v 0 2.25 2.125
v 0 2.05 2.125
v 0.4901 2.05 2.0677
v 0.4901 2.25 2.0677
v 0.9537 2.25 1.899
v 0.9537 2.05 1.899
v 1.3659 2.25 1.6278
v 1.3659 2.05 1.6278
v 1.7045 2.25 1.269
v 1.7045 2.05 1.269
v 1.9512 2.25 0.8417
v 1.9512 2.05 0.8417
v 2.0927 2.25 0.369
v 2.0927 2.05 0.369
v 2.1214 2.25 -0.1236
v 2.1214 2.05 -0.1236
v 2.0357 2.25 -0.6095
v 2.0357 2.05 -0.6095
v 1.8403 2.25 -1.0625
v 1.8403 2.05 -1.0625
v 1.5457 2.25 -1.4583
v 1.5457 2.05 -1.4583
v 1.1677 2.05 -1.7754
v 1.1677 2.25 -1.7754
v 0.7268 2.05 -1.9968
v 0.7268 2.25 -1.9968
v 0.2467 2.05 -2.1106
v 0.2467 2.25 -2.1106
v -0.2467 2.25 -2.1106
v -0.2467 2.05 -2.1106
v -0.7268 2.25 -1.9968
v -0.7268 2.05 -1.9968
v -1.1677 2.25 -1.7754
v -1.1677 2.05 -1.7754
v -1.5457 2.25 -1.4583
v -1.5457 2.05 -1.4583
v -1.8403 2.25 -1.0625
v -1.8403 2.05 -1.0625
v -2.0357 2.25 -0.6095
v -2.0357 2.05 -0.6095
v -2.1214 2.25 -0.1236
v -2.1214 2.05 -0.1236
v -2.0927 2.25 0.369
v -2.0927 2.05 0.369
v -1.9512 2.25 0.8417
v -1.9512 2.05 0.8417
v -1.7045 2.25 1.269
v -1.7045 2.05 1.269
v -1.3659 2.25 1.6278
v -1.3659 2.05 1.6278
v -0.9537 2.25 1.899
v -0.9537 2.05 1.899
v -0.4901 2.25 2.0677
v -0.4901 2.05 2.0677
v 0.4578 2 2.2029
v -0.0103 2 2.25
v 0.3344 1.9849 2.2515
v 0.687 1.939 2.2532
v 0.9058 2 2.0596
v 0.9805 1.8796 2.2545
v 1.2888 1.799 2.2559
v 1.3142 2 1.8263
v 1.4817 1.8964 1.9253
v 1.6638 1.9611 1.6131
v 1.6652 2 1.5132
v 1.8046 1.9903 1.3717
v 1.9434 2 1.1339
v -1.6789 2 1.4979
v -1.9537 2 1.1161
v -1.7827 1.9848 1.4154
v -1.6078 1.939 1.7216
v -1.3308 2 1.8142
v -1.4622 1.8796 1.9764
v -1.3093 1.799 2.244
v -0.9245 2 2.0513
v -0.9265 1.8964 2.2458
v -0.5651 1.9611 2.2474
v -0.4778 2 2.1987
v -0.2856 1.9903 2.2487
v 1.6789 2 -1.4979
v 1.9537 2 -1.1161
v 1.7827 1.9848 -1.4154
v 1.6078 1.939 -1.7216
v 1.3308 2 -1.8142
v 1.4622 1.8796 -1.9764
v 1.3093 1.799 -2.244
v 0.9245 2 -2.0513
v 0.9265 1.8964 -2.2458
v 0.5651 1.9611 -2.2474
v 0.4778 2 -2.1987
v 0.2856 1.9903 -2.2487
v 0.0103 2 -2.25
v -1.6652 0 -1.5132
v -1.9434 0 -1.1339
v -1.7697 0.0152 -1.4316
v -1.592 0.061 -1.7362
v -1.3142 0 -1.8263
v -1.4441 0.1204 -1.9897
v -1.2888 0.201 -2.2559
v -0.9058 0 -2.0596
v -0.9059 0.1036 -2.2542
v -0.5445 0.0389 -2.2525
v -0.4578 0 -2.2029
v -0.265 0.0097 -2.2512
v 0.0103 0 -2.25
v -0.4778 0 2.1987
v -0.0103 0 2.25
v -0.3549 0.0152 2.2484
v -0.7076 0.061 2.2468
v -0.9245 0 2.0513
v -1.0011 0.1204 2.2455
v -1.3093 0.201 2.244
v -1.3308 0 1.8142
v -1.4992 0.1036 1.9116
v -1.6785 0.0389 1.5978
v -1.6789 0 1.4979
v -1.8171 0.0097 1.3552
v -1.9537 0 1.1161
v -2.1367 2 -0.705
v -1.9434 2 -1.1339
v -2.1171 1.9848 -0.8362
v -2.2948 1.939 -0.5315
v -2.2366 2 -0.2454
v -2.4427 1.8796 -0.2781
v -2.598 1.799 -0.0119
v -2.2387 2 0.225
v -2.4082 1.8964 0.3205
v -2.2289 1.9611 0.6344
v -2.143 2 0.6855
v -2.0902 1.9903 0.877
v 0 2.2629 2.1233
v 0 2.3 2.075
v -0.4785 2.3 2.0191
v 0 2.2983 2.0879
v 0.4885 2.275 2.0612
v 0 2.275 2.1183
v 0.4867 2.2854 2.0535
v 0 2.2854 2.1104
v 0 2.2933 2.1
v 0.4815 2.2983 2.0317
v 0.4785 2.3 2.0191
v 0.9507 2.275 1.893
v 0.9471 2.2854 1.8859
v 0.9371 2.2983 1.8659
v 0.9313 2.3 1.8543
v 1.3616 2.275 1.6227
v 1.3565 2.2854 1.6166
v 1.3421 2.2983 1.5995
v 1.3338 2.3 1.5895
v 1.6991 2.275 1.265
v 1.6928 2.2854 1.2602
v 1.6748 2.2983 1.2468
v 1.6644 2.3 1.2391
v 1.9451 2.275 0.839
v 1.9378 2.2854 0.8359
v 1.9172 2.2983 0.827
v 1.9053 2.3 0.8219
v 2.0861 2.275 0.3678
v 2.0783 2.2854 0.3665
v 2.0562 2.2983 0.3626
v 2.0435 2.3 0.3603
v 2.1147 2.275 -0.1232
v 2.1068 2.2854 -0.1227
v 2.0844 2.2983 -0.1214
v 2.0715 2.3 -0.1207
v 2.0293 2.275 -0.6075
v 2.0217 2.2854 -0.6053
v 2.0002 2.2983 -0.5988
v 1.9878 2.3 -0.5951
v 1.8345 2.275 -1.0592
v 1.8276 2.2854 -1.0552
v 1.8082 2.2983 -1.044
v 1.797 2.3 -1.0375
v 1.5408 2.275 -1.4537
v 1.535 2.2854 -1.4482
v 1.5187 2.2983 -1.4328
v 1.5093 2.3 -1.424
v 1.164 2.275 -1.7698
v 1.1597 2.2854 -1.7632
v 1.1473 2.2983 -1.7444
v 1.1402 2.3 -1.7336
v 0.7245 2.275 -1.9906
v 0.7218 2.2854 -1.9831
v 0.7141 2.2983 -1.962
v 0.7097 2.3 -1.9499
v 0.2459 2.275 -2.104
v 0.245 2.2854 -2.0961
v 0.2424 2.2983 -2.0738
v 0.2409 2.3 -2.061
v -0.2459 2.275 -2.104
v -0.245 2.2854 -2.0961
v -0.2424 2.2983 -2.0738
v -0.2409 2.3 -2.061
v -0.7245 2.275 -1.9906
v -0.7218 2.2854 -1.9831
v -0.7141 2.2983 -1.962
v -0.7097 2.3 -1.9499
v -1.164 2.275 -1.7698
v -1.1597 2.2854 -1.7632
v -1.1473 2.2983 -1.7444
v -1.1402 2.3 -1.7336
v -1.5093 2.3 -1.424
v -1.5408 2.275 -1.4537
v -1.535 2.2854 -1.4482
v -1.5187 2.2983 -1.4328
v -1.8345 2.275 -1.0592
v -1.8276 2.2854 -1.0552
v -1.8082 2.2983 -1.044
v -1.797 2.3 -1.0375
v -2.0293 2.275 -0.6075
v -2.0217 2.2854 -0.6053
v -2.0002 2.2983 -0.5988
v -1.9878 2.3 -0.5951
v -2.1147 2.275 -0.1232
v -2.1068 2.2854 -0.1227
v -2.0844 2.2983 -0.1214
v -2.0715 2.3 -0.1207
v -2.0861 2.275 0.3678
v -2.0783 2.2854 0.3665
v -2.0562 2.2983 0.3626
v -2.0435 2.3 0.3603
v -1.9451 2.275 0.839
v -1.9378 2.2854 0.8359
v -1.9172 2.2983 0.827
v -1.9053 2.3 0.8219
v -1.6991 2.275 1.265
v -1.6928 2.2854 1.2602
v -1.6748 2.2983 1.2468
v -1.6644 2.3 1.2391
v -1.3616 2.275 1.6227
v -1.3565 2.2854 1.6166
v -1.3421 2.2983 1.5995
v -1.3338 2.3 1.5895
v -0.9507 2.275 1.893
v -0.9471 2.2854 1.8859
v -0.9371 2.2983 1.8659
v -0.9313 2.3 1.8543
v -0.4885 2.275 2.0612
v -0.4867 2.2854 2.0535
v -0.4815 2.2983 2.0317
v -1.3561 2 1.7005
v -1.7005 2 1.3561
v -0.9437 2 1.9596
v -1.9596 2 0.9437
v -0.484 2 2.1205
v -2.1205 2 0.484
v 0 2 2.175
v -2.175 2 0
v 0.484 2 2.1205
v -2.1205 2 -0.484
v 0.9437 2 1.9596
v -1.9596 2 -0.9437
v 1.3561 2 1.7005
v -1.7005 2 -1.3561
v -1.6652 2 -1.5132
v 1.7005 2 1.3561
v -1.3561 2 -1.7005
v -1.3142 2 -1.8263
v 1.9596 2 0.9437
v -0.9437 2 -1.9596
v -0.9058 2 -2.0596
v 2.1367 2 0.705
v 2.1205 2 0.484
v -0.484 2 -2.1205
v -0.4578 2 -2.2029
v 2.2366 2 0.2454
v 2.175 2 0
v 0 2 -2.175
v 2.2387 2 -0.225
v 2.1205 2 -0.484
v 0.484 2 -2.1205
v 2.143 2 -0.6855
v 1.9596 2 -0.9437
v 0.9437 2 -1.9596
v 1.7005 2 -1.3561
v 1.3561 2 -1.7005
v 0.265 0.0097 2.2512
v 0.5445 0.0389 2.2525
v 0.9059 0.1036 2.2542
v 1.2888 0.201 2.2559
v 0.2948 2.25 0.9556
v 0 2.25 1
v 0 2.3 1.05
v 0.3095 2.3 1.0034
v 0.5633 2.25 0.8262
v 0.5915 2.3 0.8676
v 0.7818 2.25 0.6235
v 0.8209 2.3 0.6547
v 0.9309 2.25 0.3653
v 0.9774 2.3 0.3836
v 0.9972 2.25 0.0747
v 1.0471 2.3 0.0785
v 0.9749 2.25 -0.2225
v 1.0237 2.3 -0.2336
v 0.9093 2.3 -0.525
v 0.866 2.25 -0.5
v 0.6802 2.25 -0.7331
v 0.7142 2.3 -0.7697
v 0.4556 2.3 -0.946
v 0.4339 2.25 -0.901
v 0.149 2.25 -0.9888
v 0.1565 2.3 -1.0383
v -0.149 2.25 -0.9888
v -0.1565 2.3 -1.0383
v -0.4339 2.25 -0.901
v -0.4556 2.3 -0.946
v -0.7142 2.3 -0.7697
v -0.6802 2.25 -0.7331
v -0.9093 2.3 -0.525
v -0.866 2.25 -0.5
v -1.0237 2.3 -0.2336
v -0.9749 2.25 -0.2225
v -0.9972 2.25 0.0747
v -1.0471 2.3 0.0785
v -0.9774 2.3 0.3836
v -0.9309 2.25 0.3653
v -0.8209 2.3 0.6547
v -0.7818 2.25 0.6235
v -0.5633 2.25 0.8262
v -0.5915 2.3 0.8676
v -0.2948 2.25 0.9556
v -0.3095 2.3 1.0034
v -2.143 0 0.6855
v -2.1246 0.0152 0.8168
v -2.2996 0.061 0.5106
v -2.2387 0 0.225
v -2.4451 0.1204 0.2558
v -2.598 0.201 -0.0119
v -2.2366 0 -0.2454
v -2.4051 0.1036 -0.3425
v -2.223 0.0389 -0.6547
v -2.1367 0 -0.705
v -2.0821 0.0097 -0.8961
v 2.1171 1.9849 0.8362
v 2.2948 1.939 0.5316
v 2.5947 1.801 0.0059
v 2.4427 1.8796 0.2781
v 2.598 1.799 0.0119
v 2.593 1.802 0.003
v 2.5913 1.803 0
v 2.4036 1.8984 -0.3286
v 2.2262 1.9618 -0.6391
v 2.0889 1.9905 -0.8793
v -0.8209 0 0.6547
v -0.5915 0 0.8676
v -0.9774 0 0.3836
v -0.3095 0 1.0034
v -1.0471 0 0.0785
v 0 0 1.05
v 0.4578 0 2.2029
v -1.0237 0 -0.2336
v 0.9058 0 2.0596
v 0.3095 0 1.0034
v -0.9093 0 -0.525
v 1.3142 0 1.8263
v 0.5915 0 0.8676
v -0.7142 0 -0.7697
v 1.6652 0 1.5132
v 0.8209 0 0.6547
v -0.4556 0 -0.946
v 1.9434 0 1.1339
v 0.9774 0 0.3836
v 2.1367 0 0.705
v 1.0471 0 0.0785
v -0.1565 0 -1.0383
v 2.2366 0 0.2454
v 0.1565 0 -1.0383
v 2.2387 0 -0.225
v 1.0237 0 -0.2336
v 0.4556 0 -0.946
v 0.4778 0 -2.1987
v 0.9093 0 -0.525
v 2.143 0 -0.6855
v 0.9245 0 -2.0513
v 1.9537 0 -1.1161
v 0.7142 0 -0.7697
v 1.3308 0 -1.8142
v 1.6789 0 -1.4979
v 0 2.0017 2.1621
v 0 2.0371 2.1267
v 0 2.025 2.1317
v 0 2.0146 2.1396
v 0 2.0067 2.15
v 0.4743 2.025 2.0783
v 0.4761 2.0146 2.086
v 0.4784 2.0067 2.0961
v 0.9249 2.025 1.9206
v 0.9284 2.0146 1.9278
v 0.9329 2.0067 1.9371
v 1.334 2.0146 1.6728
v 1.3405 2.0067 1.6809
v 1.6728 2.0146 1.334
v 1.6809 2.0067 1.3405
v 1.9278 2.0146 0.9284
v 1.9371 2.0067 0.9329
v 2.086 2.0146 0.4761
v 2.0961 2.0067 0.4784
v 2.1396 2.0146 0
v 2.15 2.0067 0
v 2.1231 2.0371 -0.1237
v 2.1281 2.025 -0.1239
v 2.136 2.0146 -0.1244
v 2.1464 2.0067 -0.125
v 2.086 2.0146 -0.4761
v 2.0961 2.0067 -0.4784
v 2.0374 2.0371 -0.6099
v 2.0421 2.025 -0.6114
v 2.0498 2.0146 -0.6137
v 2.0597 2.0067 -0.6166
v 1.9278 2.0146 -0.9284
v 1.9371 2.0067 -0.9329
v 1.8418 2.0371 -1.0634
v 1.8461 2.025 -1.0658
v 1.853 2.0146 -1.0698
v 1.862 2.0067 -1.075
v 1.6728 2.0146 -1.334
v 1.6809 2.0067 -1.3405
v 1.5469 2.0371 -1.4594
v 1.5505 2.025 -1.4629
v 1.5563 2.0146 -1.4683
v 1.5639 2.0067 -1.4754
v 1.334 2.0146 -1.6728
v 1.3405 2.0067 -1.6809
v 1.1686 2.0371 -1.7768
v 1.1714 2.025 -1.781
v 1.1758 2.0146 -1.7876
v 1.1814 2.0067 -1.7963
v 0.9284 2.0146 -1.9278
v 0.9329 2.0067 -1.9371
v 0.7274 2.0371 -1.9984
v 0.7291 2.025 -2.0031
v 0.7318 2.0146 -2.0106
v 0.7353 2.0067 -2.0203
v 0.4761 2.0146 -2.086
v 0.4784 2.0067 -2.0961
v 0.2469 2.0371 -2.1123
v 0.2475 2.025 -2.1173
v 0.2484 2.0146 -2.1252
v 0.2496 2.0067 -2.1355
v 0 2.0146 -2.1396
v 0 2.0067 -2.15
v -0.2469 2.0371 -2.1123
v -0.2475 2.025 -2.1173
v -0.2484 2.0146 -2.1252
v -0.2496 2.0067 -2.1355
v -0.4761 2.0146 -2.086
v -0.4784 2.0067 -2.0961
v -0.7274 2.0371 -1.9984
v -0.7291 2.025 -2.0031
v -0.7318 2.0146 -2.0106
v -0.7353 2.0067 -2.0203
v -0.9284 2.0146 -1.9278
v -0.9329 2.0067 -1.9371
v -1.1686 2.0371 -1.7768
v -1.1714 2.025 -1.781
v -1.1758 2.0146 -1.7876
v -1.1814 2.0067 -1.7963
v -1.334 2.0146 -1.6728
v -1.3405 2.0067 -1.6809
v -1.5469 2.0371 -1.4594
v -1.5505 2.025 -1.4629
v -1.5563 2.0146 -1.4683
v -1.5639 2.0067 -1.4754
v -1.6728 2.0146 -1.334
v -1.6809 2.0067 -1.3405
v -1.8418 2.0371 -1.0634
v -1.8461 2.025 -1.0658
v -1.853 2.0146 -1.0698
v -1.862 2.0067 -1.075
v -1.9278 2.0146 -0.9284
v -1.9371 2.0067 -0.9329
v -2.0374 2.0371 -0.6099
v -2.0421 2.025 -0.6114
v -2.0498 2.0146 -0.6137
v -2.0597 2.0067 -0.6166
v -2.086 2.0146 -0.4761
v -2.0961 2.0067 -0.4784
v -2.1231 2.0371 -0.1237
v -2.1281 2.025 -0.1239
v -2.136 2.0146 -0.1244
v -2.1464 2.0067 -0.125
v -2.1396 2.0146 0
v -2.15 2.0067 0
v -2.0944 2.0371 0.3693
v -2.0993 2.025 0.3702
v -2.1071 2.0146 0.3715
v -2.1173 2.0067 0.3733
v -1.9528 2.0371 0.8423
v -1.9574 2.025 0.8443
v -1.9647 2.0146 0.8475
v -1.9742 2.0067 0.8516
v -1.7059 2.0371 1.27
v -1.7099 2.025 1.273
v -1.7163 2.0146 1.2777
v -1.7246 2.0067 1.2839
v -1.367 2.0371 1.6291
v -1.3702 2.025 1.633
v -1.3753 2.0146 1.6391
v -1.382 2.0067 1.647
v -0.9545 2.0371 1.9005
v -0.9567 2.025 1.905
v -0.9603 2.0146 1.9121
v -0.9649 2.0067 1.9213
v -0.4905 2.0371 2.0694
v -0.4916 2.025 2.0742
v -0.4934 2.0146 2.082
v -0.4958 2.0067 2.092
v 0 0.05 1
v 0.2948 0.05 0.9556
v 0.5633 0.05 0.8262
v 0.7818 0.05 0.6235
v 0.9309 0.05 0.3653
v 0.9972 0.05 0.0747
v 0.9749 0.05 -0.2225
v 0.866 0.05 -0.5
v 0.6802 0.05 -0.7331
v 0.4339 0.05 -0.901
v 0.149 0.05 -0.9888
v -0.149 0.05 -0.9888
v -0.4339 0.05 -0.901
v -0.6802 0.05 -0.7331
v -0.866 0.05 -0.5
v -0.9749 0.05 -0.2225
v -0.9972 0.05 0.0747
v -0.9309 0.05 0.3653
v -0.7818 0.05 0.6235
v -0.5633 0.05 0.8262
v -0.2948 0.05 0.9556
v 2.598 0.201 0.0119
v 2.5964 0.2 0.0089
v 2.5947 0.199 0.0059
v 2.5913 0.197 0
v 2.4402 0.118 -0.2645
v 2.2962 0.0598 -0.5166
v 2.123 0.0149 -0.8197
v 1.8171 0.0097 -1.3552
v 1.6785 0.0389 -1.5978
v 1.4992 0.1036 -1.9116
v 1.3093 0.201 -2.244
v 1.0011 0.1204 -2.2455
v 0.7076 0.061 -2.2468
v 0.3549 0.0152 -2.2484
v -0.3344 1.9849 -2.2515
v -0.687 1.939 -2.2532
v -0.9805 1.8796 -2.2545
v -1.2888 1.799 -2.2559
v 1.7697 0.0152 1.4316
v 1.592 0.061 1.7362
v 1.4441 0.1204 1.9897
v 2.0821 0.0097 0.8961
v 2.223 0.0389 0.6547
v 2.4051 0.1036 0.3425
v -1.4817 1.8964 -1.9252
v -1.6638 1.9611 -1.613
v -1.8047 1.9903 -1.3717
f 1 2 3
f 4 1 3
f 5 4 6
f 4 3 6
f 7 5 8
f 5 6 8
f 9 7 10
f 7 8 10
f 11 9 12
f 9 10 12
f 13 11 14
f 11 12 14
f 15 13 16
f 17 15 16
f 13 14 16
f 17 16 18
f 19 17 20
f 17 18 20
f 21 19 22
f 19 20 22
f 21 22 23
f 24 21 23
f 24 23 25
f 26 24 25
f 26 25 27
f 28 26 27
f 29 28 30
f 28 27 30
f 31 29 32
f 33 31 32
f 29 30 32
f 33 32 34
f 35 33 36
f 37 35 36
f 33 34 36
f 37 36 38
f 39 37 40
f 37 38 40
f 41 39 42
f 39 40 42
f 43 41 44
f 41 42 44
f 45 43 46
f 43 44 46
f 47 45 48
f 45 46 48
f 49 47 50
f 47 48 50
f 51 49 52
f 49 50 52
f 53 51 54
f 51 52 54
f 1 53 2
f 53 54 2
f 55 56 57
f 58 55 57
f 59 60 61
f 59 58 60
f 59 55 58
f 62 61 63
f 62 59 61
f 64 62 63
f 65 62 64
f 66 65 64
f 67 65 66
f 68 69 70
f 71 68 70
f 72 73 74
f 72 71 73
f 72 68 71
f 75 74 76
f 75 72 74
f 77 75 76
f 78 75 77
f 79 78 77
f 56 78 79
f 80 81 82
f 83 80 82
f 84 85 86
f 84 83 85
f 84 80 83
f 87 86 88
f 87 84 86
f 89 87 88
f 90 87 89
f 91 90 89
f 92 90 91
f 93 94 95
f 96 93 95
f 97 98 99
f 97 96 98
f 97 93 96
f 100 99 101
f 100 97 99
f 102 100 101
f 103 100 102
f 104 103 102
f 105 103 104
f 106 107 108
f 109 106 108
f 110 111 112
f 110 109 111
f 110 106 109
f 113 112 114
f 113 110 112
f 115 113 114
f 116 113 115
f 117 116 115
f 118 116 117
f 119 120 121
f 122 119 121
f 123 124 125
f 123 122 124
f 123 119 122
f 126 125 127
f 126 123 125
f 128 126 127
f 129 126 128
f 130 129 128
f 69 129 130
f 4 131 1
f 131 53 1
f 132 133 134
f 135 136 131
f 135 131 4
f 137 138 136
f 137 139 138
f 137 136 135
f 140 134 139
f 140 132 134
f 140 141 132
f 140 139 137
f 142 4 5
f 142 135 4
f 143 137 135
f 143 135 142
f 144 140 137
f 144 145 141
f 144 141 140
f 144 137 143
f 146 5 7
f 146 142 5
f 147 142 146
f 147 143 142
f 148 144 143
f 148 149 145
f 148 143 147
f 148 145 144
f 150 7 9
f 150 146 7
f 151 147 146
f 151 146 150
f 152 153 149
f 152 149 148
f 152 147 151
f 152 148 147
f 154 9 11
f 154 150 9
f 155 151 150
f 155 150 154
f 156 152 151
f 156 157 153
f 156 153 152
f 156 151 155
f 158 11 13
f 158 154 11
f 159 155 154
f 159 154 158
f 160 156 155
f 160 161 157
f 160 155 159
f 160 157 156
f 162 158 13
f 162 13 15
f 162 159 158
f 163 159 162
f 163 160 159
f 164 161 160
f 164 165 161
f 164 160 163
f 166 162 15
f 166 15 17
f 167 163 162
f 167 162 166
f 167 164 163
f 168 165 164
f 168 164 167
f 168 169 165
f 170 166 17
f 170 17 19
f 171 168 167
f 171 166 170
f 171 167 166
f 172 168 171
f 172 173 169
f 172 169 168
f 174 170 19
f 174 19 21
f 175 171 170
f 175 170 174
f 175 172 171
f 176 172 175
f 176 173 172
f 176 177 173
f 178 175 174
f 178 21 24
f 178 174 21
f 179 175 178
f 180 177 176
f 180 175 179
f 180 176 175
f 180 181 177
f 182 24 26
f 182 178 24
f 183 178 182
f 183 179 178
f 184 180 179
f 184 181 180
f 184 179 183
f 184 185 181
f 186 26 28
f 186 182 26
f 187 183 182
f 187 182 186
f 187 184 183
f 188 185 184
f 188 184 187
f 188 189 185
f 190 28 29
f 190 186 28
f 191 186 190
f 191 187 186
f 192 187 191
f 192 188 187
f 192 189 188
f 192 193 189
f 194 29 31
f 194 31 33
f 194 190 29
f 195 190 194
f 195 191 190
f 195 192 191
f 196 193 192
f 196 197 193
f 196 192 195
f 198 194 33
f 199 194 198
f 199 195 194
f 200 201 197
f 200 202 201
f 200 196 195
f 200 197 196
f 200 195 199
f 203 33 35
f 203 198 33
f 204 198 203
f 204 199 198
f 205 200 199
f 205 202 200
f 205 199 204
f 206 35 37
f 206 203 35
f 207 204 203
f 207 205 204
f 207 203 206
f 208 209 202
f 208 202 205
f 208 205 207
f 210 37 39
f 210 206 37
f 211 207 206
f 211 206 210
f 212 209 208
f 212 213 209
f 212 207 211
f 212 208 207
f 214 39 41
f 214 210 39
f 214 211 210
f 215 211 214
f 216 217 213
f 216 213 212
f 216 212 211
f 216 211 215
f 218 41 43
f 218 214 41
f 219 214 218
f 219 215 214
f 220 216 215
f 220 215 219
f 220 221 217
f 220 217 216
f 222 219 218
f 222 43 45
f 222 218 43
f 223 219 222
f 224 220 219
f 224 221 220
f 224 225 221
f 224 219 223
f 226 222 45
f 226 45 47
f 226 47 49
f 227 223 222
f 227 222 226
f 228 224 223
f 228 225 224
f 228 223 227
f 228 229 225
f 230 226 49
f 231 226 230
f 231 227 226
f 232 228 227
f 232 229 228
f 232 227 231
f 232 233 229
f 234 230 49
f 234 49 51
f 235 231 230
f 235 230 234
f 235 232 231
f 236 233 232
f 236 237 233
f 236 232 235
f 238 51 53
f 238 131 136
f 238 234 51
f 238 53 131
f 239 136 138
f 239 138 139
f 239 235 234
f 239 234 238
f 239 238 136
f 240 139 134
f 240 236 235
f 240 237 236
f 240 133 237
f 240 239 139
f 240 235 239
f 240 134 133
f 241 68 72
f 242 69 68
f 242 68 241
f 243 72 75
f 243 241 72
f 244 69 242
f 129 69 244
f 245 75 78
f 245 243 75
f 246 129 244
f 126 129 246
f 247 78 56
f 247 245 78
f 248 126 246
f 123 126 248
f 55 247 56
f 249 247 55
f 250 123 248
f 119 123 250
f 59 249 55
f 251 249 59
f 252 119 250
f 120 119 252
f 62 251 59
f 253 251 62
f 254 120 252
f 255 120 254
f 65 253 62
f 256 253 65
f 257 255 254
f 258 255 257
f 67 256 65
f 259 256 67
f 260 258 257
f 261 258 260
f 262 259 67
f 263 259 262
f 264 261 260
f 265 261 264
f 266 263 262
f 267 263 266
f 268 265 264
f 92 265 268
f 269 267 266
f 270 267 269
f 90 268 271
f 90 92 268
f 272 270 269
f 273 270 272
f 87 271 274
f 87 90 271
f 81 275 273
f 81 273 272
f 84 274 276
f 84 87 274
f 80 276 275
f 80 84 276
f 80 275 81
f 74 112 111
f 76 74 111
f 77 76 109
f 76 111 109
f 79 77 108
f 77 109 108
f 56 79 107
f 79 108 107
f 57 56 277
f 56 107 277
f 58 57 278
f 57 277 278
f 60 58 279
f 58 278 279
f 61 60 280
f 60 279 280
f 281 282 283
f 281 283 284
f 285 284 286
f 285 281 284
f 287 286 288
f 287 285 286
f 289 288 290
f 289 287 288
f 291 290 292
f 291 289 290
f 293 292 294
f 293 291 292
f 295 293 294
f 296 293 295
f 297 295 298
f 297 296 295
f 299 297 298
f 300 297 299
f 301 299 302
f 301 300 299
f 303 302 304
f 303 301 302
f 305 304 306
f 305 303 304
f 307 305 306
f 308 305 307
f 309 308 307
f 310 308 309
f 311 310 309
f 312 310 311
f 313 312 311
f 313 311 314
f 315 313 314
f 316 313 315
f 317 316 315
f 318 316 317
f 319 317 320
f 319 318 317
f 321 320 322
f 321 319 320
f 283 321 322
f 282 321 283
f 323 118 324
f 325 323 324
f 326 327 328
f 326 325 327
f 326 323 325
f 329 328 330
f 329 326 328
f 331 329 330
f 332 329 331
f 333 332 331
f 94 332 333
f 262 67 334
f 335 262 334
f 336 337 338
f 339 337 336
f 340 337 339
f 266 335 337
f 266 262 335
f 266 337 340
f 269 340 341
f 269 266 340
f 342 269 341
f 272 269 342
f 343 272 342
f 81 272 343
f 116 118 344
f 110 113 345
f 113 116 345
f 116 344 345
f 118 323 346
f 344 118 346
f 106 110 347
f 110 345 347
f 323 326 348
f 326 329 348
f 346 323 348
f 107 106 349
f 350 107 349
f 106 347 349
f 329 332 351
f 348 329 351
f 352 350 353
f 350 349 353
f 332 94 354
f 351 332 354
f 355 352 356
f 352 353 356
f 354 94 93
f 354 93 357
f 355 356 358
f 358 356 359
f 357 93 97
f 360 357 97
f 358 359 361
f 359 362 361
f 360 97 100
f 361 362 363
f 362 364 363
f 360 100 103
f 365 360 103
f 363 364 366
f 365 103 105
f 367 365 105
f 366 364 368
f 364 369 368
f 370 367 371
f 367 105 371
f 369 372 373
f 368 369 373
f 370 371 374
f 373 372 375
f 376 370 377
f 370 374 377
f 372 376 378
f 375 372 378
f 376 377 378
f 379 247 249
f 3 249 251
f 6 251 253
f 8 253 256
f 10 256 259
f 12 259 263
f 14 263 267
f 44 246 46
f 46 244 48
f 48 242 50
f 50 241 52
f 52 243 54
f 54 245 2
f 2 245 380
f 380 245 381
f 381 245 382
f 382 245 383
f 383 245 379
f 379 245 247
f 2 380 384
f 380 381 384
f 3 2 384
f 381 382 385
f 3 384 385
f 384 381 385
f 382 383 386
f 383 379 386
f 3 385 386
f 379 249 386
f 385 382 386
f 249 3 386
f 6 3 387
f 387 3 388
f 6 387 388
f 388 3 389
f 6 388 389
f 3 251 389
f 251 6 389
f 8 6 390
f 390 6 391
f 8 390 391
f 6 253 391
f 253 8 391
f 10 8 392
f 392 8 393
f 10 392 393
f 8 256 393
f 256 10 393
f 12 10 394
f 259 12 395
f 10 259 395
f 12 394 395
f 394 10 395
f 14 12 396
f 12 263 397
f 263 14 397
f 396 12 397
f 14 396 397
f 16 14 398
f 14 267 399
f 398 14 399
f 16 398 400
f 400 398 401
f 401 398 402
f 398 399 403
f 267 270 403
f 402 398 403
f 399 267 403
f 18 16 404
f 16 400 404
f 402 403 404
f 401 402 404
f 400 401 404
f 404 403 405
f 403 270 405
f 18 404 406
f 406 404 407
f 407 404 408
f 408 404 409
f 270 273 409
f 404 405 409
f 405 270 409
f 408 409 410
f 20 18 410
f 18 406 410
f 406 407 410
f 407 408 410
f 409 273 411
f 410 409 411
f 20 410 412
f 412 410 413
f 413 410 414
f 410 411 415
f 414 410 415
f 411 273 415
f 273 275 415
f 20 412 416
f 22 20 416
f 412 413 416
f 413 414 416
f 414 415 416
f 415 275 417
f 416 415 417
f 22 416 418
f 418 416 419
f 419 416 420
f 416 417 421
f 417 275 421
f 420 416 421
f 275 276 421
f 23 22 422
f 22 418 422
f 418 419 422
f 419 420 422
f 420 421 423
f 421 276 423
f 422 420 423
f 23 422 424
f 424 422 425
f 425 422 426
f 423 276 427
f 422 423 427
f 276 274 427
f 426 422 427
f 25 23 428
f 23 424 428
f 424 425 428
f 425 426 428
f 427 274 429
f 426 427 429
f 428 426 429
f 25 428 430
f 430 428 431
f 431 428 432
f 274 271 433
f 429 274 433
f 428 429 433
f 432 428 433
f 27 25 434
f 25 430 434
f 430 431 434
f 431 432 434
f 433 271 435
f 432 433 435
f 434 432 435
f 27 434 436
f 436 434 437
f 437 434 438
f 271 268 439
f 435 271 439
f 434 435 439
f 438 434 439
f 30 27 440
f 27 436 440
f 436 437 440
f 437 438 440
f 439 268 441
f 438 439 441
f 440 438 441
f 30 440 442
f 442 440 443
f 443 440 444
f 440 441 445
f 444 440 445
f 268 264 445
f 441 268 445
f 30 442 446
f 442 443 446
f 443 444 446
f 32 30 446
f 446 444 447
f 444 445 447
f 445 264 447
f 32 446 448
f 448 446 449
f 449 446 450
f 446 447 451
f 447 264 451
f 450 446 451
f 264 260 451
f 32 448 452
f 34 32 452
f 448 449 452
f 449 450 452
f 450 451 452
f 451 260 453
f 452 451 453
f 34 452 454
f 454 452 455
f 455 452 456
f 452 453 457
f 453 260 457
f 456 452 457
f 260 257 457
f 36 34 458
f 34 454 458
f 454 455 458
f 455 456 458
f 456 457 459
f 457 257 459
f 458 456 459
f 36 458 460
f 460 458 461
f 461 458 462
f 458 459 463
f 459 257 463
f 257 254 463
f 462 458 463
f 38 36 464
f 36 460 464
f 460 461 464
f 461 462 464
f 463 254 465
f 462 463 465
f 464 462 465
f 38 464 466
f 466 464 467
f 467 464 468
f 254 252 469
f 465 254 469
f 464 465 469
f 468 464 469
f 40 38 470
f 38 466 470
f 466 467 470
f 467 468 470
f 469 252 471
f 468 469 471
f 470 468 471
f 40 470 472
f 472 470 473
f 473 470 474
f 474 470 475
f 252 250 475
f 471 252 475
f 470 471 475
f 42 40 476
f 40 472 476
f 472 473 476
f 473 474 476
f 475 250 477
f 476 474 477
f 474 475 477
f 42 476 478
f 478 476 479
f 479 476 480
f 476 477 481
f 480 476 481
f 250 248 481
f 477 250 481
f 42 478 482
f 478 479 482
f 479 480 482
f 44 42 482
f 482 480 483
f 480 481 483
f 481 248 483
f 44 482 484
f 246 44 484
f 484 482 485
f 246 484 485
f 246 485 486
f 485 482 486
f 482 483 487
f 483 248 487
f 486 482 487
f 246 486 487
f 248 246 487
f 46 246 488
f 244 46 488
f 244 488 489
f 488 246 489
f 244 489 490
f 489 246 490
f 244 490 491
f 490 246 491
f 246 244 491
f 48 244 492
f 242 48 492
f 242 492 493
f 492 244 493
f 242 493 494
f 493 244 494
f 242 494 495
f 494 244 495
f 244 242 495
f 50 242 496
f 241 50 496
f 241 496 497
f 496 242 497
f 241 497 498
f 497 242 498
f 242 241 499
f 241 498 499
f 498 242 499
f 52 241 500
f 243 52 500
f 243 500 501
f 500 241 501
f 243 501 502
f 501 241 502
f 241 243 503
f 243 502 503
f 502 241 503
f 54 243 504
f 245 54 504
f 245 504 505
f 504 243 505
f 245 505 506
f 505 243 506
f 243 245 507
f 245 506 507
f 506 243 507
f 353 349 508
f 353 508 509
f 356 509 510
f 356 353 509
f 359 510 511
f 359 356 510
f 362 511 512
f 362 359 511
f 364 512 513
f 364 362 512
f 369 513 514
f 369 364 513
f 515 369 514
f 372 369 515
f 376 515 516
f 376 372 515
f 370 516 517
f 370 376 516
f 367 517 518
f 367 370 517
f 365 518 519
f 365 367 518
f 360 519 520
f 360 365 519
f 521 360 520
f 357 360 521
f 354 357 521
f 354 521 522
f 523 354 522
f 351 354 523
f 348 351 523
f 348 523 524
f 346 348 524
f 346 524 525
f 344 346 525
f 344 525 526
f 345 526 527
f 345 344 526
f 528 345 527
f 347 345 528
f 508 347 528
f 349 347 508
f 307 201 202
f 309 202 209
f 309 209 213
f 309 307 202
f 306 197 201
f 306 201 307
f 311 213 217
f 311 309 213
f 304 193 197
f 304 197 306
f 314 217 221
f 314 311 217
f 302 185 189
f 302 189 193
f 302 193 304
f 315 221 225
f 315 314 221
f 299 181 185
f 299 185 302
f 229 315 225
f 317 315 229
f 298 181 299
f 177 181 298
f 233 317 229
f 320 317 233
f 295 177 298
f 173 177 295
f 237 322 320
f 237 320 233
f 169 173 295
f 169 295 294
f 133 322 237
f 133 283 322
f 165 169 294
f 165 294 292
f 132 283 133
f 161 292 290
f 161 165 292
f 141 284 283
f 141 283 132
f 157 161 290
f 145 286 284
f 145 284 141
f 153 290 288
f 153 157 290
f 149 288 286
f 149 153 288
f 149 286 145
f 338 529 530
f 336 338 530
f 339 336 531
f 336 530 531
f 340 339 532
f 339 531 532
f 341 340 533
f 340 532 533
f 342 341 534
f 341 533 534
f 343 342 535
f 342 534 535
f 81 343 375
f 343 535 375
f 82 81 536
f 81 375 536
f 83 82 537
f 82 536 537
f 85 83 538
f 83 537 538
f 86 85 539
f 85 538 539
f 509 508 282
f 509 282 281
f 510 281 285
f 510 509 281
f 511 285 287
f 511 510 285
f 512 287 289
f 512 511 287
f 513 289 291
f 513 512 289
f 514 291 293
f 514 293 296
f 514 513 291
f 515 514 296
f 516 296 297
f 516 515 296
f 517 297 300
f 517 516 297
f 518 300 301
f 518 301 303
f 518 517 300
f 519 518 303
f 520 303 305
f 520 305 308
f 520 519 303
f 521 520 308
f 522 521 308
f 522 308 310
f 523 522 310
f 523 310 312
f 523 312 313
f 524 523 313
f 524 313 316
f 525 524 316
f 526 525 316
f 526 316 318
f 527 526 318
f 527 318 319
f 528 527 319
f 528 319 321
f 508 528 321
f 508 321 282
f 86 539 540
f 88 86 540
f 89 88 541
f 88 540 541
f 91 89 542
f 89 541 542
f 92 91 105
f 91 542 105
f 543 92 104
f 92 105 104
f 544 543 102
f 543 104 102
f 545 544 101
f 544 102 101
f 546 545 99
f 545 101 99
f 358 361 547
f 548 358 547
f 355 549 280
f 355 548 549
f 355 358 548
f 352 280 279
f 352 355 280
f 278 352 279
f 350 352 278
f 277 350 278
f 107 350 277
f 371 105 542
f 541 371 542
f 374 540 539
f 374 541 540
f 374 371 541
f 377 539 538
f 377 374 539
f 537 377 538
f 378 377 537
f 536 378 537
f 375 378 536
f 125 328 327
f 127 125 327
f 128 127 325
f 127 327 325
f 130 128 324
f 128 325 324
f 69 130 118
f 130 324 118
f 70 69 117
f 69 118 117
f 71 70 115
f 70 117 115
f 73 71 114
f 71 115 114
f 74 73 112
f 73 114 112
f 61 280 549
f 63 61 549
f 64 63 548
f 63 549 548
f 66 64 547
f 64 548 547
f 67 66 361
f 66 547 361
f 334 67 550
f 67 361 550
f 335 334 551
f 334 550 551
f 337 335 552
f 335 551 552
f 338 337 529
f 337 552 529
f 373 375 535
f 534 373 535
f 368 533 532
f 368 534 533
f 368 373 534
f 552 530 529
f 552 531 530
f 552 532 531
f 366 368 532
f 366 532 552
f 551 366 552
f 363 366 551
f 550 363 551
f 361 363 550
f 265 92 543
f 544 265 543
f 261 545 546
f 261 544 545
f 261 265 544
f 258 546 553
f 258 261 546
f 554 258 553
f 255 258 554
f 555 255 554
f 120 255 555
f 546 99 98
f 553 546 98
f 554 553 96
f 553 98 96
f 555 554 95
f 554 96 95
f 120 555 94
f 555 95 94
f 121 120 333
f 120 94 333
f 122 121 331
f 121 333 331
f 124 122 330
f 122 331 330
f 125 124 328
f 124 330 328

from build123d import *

# Parameters (mm, degrees)
SKETCH1_R           = 1
BOSS_EXTRUDE1_DEPTH = 2
SKETCH2_OUTSIDE_W   = 12.094
SKETCH2_OUTSIDE_H   = 11.41
SKETCH2_OUTSIDE_R   = 2.25
CUT_EXTRUDE2_DEPTH  = 1
CUT_EXTRUDE2_DRAFT  = -60
SKETCH3_OUTSIDE_W   = 12.094
SKETCH3_OUTSIDE_H   = 11.41
SKETCH3_OUTSIDE_R   = 2.25
CUT_EXTRUDE3_DEPTH  = 1
CUT_EXTRUDE3_DRAFT  = -60
SKETCH4_R           = 2.125
SKETCH4_R_2         = 1
BOSS_EXTRUDE2_DEPTH = 0.3
FILLET1_R           = 0.05
CHAMFER1_SIZE       = 0.05


with BuildPart() as part:
    # Sketch1 → Boss-Extrude1 (new body)
    with BuildSketch(Plane(origin=(0, 0, 0), x_dir=(1, 0, 0), z_dir=(0, 1, 0))):
        Polygon((1.309294077, 2.244047464), (-1.288755073, 2.255905663), (-2.598049149, 0.011858199), (-1.309294077, -2.244047464), (1.288755073, -2.255905663), (2.598049149, -0.011858199), align=None)
        with Locations(Location((0, 0, 0), (0, 0, 270))):
            Circle(SKETCH1_R, mode=Mode.SUBTRACT)
    extrude(amount=BOSS_EXTRUDE1_DEPTH)


with BuildPart() as cut_extrude2_tool:
    # Sketch2 outside → Cut-Extrude2 (with draft: the straight prism first)
    with BuildSketch(Plane(origin=(0, 2, 0), x_dir=(1, 0, 0), z_dir=(0, 1, 0))):
        Rectangle(SKETCH2_OUTSIDE_W, SKETCH2_OUTSIDE_H)
        Circle(SKETCH2_OUTSIDE_R, mode=Mode.SUBTRACT)
    extrude(amount=-CUT_EXTRUDE2_DEPTH)
    # Cut-Extrude2: the draft: its side faces are tilted about the plane it starts from
    cut_extrude2_sides = [cut_extrude2_tool.faces().sort_by_distance(p)[0] for p in [
        (0, 1.5, 5.705),
        (6.047, 1.5, 0),
        (0, 1.5, -5.705),
        (-6.047, 1.5, 0),
        (-2.25, 1.5, 0),
    ]]
    draft(cut_extrude2_sides, Plane(origin=(0, 2, 0), x_dir=(1, 0, 0), z_dir=(0, 1, 0)), CUT_EXTRUDE2_DRAFT)


with BuildPart() as part_1:
    add(part.part)

    # Cut-Extrude2: cut by cut_extrude2_tool
    add(cut_extrude2_tool.part, mode=Mode.SUBTRACT)


with BuildPart() as cut_extrude3_tool:
    # Sketch3 outside → Cut-Extrude3 (with draft: the straight prism first)
    with BuildSketch(Plane.XZ):
        Rectangle(SKETCH3_OUTSIDE_W, SKETCH3_OUTSIDE_H)
        Circle(SKETCH3_OUTSIDE_R, mode=Mode.SUBTRACT)
    extrude(amount=-CUT_EXTRUDE3_DEPTH)
    # Cut-Extrude3: the draft: its side faces are tilted about the plane it starts from
    cut_extrude3_sides = [cut_extrude3_tool.faces().sort_by_distance(p)[0] for p in [
        (0, 0.5, -5.705),
        (6.047, 0.5, 0),
        (0, 0.5, 5.705),
        (-6.047, 0.5, 0),
        (-2.25, 0.5, 0),
    ]]
    draft(cut_extrude3_sides, Plane.XZ, CUT_EXTRUDE3_DRAFT)


with BuildPart() as part_2:
    add(part_1.part)

    # Cut-Extrude3: cut by cut_extrude3_tool
    add(cut_extrude3_tool.part, mode=Mode.SUBTRACT)

    # Sketch4 → Boss-Extrude2 (add)
    with BuildSketch(Plane(origin=(0, 2, 0), x_dir=(1, 0, 0), z_dir=(0, 1, 0))):
        with Locations(Location((0, 0, 0), (0, 0, 270))):
            Circle(SKETCH4_R)
        with Locations(Location((0, 0, 0), (0, 0, 270))):
            Circle(SKETCH4_R_2, mode=Mode.SUBTRACT)
    extrude(amount=BOSS_EXTRUDE2_DEPTH)

    # Fillet1
    fillet1_edges = [part_2.edges().sort_by_distance(p)[0] for p in [
        (0, 2.3, -2.125),
        (0, 2, -2.125),
    ]]
    fillet(fillet1_edges, radius=FILLET1_R)

    # Chamfer1
    chamfer1_edges = [part_2.edges().sort_by_distance(p)[0] for p in [
        (0, 2.3, -1),
        (0, 0, -1),
    ]]
    chamfer(chamfer1_edges, length=CHAMFER1_SIZE)


solid = part_2.part
